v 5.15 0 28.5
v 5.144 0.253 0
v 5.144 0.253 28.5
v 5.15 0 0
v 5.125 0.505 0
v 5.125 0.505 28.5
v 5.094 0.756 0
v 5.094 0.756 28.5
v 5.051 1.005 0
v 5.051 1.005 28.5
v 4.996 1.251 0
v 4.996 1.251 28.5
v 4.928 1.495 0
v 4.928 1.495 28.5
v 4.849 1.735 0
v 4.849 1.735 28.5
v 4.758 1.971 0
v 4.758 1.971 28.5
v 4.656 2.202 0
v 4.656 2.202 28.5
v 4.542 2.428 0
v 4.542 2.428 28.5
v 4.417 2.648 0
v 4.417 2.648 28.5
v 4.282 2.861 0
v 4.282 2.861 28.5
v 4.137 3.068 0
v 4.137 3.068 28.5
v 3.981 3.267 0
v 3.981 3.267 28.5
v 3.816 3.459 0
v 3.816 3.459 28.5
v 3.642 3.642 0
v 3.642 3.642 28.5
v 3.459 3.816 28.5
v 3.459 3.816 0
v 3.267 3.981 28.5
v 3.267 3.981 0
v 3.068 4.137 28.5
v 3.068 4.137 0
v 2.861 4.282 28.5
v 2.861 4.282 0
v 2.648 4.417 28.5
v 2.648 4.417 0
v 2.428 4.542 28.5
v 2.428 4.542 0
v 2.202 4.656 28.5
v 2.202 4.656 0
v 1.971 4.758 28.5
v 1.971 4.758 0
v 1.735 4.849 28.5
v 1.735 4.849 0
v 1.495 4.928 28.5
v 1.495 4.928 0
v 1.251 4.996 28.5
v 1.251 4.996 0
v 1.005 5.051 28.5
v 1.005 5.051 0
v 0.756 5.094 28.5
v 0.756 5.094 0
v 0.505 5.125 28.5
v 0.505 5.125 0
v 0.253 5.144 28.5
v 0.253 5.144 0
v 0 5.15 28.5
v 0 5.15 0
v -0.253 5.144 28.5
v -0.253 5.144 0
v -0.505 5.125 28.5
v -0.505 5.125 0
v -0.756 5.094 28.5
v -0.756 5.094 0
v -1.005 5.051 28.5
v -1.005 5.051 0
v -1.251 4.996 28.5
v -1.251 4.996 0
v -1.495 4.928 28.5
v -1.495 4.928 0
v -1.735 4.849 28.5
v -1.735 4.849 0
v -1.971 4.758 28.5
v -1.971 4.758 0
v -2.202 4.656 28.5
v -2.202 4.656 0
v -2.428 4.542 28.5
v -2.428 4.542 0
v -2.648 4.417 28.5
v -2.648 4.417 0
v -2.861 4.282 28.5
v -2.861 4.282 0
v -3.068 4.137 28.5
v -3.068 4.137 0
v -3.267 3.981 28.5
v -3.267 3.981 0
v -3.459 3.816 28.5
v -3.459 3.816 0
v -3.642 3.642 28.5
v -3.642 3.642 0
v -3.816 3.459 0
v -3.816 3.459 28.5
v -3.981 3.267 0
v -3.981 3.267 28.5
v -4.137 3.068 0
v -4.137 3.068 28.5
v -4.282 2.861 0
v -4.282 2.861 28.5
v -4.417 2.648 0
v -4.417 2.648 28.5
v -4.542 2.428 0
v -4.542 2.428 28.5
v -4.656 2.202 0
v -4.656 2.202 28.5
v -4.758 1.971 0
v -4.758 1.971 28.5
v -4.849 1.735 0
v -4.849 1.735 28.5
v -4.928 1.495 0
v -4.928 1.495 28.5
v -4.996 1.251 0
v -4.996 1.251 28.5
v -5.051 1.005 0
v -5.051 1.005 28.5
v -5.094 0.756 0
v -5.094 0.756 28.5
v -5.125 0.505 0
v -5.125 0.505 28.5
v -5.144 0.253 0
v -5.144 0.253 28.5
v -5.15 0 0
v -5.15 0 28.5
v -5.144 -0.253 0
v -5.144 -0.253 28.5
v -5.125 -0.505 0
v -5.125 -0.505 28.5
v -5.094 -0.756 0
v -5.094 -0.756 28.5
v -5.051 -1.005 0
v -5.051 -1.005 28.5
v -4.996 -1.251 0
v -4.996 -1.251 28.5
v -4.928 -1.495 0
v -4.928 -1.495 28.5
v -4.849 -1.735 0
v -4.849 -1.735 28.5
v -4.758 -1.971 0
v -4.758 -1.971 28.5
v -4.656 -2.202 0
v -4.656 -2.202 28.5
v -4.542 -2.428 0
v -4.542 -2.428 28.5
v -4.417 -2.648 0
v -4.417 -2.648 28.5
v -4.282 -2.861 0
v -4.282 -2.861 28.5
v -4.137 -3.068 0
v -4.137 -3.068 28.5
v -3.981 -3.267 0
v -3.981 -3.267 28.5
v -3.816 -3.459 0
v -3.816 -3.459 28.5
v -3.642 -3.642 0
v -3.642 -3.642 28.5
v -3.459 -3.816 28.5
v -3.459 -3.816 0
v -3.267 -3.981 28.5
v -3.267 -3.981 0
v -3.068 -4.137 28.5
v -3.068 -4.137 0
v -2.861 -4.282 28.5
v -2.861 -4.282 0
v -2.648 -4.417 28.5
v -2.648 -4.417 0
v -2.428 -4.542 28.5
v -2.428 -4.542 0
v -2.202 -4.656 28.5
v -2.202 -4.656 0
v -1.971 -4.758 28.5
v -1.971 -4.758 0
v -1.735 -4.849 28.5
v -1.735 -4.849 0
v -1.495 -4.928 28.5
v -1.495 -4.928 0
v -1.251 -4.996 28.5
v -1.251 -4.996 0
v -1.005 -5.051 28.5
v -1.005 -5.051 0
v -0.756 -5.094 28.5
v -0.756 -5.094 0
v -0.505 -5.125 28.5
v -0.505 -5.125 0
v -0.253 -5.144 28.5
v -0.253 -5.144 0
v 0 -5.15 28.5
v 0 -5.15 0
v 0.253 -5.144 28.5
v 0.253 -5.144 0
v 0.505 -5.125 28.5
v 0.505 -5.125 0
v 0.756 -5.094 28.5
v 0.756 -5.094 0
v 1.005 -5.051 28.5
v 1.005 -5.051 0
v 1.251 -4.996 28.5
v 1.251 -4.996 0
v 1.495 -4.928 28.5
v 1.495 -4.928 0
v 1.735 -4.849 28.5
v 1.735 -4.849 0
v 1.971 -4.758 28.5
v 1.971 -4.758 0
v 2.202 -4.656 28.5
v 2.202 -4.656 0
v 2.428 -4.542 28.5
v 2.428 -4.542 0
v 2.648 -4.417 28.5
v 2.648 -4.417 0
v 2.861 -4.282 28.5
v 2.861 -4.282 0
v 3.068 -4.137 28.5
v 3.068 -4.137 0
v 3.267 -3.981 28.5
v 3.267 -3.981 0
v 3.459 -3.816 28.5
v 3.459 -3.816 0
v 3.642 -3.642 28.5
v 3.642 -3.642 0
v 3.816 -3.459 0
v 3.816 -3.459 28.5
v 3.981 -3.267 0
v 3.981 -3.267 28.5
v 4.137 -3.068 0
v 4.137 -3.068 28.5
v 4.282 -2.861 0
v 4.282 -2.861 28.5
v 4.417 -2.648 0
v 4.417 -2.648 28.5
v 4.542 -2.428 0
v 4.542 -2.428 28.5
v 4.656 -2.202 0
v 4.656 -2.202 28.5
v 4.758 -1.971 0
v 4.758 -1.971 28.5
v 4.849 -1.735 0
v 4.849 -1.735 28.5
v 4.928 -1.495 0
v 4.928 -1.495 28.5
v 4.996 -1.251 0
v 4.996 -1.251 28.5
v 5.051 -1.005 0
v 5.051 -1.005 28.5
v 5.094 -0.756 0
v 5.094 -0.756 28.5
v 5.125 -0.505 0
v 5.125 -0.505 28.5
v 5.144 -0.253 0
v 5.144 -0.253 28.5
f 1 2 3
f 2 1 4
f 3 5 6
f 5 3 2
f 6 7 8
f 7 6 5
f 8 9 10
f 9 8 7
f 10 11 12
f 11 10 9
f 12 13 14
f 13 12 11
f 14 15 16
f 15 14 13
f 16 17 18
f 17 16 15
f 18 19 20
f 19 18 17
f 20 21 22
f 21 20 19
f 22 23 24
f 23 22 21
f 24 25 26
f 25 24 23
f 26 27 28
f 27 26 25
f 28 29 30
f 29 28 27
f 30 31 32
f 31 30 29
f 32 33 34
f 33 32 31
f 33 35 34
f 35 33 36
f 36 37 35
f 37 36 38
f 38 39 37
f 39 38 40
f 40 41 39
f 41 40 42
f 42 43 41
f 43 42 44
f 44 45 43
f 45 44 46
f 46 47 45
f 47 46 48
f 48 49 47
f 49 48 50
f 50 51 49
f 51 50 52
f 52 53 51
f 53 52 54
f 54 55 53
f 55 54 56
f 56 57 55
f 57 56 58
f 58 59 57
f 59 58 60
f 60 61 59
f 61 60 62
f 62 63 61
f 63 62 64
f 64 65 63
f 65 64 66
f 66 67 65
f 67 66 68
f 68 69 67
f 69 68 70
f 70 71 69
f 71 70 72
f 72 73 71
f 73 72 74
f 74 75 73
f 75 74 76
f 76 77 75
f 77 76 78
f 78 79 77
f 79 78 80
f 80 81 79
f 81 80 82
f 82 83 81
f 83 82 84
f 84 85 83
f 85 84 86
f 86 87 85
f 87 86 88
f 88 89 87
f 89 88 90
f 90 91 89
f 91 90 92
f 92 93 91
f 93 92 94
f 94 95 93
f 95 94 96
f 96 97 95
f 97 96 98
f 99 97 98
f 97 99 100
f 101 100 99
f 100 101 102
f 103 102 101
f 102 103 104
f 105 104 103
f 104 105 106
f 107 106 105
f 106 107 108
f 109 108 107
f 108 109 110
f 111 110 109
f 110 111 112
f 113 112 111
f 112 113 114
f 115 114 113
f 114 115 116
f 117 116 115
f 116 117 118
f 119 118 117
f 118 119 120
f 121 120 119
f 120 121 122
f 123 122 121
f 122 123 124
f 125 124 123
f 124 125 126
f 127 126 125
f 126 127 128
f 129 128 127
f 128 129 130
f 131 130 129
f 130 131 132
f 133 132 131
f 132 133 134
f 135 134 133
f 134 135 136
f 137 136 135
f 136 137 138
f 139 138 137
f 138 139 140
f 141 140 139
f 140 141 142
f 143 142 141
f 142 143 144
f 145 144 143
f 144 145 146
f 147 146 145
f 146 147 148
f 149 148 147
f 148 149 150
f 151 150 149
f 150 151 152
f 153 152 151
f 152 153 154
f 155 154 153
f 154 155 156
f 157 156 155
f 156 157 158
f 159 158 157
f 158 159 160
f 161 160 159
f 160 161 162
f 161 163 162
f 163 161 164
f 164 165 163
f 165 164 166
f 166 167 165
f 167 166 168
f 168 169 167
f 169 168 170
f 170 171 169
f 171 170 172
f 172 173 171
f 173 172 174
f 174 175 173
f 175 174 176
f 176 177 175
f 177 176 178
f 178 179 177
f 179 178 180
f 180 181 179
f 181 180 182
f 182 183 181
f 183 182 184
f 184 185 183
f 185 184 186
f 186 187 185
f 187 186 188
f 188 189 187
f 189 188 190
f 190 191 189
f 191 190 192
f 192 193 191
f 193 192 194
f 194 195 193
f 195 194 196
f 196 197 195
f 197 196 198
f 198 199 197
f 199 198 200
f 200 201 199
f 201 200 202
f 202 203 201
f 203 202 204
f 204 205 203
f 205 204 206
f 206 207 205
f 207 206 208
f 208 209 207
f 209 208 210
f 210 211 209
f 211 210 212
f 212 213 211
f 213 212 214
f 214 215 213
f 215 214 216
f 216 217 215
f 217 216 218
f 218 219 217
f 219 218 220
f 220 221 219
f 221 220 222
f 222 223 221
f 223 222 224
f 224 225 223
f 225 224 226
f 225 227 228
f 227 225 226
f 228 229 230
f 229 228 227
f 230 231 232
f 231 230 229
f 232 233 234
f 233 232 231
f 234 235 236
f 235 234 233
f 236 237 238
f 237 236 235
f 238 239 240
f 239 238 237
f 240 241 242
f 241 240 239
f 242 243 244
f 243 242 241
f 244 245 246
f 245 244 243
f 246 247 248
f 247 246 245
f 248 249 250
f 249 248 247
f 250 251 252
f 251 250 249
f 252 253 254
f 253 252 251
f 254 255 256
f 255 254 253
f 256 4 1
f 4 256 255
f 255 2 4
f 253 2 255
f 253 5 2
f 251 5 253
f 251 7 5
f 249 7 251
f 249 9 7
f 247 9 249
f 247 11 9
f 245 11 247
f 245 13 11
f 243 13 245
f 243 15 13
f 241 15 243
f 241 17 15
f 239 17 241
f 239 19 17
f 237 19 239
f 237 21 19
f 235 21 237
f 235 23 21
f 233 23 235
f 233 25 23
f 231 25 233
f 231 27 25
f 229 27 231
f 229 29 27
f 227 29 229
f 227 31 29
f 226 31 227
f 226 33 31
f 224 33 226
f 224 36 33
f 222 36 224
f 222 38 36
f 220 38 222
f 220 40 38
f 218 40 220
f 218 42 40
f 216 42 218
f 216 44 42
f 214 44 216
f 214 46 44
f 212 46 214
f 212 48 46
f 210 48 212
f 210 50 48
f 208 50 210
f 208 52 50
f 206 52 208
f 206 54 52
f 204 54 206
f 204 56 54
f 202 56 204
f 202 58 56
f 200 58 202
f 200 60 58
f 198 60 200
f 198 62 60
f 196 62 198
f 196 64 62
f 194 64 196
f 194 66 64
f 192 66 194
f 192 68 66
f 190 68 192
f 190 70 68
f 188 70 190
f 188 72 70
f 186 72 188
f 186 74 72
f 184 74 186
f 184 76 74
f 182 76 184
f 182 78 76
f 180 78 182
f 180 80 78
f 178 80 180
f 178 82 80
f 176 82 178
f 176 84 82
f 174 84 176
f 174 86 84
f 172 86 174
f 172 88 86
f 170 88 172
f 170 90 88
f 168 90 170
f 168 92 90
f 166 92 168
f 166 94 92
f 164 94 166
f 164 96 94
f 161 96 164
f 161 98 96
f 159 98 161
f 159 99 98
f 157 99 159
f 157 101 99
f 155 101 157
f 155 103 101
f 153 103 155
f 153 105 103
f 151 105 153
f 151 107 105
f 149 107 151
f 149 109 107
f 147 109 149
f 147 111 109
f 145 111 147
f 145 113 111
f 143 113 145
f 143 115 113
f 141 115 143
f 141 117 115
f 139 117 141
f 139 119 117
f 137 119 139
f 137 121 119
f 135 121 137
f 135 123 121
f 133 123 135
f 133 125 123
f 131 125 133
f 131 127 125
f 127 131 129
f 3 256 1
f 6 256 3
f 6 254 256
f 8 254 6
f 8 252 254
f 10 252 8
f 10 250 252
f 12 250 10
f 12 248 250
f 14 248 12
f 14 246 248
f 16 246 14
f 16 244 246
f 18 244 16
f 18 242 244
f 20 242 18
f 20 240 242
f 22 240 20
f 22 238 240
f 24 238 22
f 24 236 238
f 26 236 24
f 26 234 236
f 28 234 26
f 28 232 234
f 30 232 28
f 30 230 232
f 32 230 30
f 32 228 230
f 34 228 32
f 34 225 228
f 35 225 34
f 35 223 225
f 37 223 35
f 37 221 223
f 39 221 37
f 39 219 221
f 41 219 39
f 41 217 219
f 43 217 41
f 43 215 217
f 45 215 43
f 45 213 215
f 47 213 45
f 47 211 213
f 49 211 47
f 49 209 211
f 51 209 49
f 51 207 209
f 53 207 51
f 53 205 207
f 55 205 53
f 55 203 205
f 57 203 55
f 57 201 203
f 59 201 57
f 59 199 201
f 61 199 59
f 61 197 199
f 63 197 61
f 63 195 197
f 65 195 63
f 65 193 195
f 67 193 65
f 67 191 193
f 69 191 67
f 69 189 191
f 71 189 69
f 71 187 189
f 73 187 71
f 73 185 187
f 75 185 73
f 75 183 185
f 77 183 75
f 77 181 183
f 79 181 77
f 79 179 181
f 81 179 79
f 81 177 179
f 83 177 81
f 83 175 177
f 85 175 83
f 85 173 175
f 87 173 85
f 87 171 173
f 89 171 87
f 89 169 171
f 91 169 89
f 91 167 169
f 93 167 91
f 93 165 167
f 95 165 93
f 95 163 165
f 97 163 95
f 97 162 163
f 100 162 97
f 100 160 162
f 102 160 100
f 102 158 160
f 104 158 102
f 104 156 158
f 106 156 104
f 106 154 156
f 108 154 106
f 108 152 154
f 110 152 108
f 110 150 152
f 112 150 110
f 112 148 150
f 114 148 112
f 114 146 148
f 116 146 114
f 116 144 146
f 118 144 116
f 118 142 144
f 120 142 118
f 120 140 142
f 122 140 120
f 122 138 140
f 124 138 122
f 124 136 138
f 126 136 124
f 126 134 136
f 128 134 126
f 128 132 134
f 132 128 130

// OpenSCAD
$fn = 128;

cell_height = 28.5;   // mm
cell_diameter = 10.3; // mm

cylinder(h = cell_height, d = cell_diameter);
